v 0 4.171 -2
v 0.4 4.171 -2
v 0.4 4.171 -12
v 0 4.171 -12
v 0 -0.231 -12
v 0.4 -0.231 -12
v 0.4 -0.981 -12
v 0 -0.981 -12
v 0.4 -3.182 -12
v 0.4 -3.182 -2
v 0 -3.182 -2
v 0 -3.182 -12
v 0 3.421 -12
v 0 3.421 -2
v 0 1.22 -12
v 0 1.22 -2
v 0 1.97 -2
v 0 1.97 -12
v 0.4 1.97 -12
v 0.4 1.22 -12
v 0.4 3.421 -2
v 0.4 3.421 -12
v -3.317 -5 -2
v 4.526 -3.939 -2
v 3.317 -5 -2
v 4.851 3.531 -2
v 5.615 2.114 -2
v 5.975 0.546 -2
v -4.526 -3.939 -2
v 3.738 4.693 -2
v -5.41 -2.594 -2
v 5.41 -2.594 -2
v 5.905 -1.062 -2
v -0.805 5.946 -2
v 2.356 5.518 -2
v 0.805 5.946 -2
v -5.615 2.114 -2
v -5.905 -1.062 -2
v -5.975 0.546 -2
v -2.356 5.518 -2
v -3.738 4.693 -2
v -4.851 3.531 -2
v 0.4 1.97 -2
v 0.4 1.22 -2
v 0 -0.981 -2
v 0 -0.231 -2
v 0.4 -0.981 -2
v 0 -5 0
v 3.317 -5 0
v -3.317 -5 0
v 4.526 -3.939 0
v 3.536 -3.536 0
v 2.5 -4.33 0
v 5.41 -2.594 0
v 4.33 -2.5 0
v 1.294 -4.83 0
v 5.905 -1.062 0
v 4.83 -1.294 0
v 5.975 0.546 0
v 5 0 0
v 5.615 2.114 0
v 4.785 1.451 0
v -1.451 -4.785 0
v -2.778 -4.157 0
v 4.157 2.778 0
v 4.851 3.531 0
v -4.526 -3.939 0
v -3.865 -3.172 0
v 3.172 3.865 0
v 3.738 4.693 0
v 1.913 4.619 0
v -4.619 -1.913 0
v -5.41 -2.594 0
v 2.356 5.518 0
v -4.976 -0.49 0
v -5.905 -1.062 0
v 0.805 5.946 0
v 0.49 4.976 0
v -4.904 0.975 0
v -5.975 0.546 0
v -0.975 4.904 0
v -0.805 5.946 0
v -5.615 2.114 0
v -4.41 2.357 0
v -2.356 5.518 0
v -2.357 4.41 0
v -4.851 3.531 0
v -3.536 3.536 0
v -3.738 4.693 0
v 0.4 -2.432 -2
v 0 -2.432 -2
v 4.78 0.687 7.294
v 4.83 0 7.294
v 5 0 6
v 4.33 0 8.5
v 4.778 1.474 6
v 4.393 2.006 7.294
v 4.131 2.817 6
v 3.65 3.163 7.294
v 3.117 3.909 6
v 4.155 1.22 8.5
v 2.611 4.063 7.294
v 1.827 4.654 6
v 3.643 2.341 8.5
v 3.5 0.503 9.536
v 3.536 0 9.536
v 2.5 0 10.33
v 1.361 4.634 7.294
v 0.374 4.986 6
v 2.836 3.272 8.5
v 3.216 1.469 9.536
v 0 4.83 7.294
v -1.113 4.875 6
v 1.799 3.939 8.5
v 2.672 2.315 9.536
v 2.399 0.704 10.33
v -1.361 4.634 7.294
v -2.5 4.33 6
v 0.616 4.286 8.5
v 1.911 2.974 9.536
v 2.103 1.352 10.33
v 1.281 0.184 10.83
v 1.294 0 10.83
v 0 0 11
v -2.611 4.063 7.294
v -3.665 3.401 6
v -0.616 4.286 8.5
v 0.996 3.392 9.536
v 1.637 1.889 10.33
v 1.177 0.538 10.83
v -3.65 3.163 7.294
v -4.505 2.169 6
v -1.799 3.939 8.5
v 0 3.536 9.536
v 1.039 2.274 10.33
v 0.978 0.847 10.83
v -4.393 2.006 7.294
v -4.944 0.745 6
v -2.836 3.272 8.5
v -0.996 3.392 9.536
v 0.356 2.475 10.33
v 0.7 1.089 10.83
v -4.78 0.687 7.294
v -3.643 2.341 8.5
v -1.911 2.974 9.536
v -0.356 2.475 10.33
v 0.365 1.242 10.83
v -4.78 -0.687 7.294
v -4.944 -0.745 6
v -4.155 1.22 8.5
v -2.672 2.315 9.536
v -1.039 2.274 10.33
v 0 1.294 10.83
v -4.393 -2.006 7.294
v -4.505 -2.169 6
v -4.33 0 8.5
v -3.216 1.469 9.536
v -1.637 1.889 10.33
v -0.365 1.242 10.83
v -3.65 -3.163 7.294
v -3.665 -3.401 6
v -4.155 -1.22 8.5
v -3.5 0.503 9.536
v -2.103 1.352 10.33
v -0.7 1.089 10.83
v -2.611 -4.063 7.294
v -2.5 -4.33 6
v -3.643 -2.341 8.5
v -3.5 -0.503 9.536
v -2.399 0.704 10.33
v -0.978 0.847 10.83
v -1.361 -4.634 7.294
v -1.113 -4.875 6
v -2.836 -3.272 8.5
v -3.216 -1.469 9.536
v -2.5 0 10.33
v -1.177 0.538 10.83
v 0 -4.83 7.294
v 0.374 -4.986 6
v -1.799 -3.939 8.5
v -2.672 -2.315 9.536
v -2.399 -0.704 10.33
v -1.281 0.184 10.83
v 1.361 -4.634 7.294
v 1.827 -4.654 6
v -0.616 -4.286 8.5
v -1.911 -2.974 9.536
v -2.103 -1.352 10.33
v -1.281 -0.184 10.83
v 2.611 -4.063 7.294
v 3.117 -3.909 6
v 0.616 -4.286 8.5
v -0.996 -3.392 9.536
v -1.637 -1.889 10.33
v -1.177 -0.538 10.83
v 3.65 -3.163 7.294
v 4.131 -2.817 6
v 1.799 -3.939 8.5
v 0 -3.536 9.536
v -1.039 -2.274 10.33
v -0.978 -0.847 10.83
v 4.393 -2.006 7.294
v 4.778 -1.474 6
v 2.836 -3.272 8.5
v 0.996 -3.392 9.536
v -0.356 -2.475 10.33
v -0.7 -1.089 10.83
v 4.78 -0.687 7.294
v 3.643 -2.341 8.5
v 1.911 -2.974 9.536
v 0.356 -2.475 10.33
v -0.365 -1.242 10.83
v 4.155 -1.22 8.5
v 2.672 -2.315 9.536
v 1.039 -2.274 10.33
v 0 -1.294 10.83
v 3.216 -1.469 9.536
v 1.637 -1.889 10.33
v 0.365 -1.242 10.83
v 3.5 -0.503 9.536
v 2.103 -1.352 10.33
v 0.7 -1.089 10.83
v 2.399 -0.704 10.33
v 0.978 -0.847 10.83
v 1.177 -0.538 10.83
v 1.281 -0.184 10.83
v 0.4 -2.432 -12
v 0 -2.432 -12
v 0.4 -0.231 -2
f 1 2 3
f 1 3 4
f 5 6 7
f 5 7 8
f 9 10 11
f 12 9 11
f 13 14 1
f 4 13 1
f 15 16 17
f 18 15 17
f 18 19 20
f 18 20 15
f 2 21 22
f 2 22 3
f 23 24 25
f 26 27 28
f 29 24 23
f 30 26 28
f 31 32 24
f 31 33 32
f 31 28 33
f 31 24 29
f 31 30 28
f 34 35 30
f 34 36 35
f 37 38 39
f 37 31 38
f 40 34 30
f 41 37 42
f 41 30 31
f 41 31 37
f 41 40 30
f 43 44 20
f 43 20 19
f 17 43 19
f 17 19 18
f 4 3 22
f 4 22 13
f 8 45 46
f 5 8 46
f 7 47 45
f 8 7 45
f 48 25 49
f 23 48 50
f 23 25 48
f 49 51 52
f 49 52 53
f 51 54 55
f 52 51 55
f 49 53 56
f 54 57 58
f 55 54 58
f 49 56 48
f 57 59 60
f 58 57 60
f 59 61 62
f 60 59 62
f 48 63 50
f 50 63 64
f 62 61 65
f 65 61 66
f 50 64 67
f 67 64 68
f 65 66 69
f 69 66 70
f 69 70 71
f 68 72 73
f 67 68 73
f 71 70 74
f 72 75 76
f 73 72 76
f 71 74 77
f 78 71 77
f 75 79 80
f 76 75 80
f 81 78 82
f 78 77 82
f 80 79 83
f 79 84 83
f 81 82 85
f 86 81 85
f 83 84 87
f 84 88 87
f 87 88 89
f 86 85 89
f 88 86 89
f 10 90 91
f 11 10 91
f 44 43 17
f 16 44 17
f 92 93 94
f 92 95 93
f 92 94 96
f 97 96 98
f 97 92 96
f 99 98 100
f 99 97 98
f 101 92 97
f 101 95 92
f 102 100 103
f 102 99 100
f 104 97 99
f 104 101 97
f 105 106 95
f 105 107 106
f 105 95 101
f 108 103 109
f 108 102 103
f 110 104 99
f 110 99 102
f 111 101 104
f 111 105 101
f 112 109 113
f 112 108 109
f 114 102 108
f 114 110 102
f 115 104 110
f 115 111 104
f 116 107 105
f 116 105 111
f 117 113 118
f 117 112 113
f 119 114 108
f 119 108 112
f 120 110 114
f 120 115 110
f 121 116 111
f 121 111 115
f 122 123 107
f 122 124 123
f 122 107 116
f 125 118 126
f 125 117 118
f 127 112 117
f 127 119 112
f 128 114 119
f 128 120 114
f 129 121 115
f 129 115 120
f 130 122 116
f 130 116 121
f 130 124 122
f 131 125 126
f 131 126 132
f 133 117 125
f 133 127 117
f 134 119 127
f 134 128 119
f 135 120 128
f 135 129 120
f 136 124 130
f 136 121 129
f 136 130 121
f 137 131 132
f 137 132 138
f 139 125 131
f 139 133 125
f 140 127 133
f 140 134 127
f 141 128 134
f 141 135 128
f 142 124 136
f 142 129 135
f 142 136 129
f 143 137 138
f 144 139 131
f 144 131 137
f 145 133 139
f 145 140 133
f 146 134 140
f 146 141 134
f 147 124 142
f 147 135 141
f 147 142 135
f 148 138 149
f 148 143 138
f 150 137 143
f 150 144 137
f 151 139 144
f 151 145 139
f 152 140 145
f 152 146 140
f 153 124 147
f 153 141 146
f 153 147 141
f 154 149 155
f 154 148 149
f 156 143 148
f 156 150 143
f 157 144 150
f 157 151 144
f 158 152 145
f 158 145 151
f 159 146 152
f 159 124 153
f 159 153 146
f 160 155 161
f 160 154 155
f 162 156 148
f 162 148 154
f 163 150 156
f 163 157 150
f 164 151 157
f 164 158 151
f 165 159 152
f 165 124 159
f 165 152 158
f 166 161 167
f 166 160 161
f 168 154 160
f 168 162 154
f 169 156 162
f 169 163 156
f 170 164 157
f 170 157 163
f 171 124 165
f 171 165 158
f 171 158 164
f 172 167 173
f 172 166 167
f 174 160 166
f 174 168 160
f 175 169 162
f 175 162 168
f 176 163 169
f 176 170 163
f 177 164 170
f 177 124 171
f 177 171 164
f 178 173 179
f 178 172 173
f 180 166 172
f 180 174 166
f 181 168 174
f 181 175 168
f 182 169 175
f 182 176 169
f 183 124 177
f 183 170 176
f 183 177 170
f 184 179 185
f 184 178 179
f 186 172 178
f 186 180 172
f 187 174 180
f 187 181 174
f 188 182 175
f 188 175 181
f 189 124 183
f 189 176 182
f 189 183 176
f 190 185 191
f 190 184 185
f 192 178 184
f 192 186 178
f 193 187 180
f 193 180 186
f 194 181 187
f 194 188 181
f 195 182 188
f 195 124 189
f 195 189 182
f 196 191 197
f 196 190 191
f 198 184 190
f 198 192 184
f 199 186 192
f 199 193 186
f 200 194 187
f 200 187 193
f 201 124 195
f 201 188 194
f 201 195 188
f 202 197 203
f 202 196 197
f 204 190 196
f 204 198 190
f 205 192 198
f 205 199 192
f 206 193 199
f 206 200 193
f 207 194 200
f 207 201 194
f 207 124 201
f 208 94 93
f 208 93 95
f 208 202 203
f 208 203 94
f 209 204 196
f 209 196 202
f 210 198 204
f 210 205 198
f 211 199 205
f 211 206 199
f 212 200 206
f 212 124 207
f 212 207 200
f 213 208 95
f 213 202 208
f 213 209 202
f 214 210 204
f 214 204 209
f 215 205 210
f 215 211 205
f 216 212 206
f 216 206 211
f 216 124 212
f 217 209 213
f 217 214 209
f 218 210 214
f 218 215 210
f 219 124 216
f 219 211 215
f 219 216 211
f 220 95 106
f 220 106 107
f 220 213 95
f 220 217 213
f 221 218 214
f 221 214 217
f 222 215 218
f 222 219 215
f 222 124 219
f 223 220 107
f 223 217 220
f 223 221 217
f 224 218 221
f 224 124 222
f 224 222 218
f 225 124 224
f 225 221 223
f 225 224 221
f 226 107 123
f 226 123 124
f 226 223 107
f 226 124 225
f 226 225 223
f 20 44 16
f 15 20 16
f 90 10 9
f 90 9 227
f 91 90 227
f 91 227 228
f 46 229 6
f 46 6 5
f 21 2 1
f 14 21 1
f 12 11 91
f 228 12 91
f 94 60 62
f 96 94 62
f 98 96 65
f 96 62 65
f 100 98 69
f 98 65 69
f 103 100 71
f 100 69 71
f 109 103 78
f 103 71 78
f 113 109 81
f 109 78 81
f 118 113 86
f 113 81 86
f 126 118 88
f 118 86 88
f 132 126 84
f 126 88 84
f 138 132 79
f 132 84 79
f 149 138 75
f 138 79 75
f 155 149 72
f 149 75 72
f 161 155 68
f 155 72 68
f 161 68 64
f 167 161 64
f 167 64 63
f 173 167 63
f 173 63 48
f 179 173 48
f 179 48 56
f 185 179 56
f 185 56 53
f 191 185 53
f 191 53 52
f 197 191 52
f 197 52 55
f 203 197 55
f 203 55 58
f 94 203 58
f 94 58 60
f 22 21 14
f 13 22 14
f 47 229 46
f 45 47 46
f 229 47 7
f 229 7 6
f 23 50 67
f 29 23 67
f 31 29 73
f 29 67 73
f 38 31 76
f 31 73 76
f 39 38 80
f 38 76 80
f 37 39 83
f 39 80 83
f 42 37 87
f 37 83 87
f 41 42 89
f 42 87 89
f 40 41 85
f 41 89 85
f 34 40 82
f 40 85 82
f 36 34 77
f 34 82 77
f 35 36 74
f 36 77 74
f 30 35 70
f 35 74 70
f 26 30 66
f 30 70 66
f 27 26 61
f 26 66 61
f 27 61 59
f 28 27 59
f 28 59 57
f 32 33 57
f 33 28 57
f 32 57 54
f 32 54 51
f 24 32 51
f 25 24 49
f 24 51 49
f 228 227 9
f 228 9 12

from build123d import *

# Parameters (mm, degrees)
SKETCH1_R             = 5
BOSS_EXTRUDE1_DEPTH   = 6
DOME1_FACE_RADIUS     = 5
DOME1_HEIGHT          = 5
SKETCH2_R             = 6
BOSS_EXTRUDE2_DEPTH   = 2
SKETCH3_W             = 16.856000324
SKETCH3_H             = 3.846233779
CUT_EXTRUDE4_DEPTH    = 2
SKETCH4_W             = 0.4
SKETCH4_H             = 0.75
BOSS_EXTRUDE3_DEPTH   = 10
BOSS_EXTRUDE3_2_DEPTH = 10
BOSS_EXTRUDE3_3_DEPTH = 10
BOSS_EXTRUDE3_4_DEPTH = 10


with BuildPart() as part:
    # Sketch1 → Boss-Extrude1 (new body)
    with BuildSketch(Plane.XY):
        Circle(SKETCH1_R)
    extrude(amount=BOSS_EXTRUDE1_DEPTH)

    # Dome1: a dome of height H over a round flat face of radius A is a cap of a sphere of radius (A * A + H * H) / (2 * H)
    dome1_r = (DOME1_FACE_RADIUS * DOME1_FACE_RADIUS + DOME1_HEIGHT * DOME1_HEIGHT) / (2 * DOME1_HEIGHT)
    dome1_base = Plane((0, 0, 6), z_dir=(0, 0, 1))
    with Locations(dome1_base.offset(DOME1_HEIGHT - dome1_r)):
        dome1_ball = Sphere(dome1_r, mode=Mode.PRIVATE)
    add(split(dome1_ball, bisect_by=dome1_base, keep=Keep.TOP, mode=Mode.PRIVATE))

    # Sketch2 → Boss-Extrude2 (add)
    with BuildSketch(Plane(origin=(0, 0, 0), x_dir=(-1, 0, 0), z_dir=(0, 0, -1))):
        Circle(SKETCH2_R)
    extrude(amount=BOSS_EXTRUDE2_DEPTH)

    # Sketch3 → Cut-Extrude4 (cut)
    with BuildSketch(Plane(origin=(0, 0, -2), x_dir=(-1, 0, 0), z_dir=(0, 0, -1))):
        with Locations((-0.159987828, -6.92311689)):
            Rectangle(SKETCH3_W, SKETCH3_H)
    extrude(amount=-CUT_EXTRUDE4_DEPTH, mode=Mode.SUBTRACT)


with BuildPart() as body_2:
    # Sketch4 → Boss-Extrude3 (new body)
    with BuildSketch(Plane(origin=(0, 0, -2), x_dir=(-1, 0, 0), z_dir=(0, 0, -1))):
        with Locations((-0.2, 1.594963341)):
            Rectangle(SKETCH4_W, SKETCH4_H)
    extrude(amount=BOSS_EXTRUDE3_DEPTH)


with BuildPart() as body_3:
    # Sketch4 → Boss-Extrude3 2 (new body)
    with BuildSketch(Plane(origin=(0, 0, -2), x_dir=(-1, 0, 0), z_dir=(0, 0, -1))):
        with Locations((-0.2, 3.795856983)):
            Rectangle(SKETCH4_W, SKETCH4_H)
    extrude(amount=BOSS_EXTRUDE3_2_DEPTH)


with BuildPart() as body_4:
    # Sketch4 → Boss-Extrude3 3 (new body)
    with BuildSketch(Plane(origin=(0, 0, -2), x_dir=(-1, 0, 0), z_dir=(0, 0, -1))):
        with Locations((-0.2, -0.605930301)):
            Rectangle(SKETCH4_W, SKETCH4_H)
    extrude(amount=BOSS_EXTRUDE3_3_DEPTH)


with BuildPart() as body_5:
    # Sketch4 → Boss-Extrude3 4 (new body)
    with BuildSketch(Plane(origin=(0, 0, -2), x_dir=(-1, 0, 0), z_dir=(0, 0, -1))):
        with Locations((-0.2, -2.806823942)):
            Rectangle(SKETCH4_W, SKETCH4_H)
    extrude(amount=BOSS_EXTRUDE3_4_DEPTH)


solid = Compound([part.part, body_2.part, body_3.part, body_4.part, body_5.part])
